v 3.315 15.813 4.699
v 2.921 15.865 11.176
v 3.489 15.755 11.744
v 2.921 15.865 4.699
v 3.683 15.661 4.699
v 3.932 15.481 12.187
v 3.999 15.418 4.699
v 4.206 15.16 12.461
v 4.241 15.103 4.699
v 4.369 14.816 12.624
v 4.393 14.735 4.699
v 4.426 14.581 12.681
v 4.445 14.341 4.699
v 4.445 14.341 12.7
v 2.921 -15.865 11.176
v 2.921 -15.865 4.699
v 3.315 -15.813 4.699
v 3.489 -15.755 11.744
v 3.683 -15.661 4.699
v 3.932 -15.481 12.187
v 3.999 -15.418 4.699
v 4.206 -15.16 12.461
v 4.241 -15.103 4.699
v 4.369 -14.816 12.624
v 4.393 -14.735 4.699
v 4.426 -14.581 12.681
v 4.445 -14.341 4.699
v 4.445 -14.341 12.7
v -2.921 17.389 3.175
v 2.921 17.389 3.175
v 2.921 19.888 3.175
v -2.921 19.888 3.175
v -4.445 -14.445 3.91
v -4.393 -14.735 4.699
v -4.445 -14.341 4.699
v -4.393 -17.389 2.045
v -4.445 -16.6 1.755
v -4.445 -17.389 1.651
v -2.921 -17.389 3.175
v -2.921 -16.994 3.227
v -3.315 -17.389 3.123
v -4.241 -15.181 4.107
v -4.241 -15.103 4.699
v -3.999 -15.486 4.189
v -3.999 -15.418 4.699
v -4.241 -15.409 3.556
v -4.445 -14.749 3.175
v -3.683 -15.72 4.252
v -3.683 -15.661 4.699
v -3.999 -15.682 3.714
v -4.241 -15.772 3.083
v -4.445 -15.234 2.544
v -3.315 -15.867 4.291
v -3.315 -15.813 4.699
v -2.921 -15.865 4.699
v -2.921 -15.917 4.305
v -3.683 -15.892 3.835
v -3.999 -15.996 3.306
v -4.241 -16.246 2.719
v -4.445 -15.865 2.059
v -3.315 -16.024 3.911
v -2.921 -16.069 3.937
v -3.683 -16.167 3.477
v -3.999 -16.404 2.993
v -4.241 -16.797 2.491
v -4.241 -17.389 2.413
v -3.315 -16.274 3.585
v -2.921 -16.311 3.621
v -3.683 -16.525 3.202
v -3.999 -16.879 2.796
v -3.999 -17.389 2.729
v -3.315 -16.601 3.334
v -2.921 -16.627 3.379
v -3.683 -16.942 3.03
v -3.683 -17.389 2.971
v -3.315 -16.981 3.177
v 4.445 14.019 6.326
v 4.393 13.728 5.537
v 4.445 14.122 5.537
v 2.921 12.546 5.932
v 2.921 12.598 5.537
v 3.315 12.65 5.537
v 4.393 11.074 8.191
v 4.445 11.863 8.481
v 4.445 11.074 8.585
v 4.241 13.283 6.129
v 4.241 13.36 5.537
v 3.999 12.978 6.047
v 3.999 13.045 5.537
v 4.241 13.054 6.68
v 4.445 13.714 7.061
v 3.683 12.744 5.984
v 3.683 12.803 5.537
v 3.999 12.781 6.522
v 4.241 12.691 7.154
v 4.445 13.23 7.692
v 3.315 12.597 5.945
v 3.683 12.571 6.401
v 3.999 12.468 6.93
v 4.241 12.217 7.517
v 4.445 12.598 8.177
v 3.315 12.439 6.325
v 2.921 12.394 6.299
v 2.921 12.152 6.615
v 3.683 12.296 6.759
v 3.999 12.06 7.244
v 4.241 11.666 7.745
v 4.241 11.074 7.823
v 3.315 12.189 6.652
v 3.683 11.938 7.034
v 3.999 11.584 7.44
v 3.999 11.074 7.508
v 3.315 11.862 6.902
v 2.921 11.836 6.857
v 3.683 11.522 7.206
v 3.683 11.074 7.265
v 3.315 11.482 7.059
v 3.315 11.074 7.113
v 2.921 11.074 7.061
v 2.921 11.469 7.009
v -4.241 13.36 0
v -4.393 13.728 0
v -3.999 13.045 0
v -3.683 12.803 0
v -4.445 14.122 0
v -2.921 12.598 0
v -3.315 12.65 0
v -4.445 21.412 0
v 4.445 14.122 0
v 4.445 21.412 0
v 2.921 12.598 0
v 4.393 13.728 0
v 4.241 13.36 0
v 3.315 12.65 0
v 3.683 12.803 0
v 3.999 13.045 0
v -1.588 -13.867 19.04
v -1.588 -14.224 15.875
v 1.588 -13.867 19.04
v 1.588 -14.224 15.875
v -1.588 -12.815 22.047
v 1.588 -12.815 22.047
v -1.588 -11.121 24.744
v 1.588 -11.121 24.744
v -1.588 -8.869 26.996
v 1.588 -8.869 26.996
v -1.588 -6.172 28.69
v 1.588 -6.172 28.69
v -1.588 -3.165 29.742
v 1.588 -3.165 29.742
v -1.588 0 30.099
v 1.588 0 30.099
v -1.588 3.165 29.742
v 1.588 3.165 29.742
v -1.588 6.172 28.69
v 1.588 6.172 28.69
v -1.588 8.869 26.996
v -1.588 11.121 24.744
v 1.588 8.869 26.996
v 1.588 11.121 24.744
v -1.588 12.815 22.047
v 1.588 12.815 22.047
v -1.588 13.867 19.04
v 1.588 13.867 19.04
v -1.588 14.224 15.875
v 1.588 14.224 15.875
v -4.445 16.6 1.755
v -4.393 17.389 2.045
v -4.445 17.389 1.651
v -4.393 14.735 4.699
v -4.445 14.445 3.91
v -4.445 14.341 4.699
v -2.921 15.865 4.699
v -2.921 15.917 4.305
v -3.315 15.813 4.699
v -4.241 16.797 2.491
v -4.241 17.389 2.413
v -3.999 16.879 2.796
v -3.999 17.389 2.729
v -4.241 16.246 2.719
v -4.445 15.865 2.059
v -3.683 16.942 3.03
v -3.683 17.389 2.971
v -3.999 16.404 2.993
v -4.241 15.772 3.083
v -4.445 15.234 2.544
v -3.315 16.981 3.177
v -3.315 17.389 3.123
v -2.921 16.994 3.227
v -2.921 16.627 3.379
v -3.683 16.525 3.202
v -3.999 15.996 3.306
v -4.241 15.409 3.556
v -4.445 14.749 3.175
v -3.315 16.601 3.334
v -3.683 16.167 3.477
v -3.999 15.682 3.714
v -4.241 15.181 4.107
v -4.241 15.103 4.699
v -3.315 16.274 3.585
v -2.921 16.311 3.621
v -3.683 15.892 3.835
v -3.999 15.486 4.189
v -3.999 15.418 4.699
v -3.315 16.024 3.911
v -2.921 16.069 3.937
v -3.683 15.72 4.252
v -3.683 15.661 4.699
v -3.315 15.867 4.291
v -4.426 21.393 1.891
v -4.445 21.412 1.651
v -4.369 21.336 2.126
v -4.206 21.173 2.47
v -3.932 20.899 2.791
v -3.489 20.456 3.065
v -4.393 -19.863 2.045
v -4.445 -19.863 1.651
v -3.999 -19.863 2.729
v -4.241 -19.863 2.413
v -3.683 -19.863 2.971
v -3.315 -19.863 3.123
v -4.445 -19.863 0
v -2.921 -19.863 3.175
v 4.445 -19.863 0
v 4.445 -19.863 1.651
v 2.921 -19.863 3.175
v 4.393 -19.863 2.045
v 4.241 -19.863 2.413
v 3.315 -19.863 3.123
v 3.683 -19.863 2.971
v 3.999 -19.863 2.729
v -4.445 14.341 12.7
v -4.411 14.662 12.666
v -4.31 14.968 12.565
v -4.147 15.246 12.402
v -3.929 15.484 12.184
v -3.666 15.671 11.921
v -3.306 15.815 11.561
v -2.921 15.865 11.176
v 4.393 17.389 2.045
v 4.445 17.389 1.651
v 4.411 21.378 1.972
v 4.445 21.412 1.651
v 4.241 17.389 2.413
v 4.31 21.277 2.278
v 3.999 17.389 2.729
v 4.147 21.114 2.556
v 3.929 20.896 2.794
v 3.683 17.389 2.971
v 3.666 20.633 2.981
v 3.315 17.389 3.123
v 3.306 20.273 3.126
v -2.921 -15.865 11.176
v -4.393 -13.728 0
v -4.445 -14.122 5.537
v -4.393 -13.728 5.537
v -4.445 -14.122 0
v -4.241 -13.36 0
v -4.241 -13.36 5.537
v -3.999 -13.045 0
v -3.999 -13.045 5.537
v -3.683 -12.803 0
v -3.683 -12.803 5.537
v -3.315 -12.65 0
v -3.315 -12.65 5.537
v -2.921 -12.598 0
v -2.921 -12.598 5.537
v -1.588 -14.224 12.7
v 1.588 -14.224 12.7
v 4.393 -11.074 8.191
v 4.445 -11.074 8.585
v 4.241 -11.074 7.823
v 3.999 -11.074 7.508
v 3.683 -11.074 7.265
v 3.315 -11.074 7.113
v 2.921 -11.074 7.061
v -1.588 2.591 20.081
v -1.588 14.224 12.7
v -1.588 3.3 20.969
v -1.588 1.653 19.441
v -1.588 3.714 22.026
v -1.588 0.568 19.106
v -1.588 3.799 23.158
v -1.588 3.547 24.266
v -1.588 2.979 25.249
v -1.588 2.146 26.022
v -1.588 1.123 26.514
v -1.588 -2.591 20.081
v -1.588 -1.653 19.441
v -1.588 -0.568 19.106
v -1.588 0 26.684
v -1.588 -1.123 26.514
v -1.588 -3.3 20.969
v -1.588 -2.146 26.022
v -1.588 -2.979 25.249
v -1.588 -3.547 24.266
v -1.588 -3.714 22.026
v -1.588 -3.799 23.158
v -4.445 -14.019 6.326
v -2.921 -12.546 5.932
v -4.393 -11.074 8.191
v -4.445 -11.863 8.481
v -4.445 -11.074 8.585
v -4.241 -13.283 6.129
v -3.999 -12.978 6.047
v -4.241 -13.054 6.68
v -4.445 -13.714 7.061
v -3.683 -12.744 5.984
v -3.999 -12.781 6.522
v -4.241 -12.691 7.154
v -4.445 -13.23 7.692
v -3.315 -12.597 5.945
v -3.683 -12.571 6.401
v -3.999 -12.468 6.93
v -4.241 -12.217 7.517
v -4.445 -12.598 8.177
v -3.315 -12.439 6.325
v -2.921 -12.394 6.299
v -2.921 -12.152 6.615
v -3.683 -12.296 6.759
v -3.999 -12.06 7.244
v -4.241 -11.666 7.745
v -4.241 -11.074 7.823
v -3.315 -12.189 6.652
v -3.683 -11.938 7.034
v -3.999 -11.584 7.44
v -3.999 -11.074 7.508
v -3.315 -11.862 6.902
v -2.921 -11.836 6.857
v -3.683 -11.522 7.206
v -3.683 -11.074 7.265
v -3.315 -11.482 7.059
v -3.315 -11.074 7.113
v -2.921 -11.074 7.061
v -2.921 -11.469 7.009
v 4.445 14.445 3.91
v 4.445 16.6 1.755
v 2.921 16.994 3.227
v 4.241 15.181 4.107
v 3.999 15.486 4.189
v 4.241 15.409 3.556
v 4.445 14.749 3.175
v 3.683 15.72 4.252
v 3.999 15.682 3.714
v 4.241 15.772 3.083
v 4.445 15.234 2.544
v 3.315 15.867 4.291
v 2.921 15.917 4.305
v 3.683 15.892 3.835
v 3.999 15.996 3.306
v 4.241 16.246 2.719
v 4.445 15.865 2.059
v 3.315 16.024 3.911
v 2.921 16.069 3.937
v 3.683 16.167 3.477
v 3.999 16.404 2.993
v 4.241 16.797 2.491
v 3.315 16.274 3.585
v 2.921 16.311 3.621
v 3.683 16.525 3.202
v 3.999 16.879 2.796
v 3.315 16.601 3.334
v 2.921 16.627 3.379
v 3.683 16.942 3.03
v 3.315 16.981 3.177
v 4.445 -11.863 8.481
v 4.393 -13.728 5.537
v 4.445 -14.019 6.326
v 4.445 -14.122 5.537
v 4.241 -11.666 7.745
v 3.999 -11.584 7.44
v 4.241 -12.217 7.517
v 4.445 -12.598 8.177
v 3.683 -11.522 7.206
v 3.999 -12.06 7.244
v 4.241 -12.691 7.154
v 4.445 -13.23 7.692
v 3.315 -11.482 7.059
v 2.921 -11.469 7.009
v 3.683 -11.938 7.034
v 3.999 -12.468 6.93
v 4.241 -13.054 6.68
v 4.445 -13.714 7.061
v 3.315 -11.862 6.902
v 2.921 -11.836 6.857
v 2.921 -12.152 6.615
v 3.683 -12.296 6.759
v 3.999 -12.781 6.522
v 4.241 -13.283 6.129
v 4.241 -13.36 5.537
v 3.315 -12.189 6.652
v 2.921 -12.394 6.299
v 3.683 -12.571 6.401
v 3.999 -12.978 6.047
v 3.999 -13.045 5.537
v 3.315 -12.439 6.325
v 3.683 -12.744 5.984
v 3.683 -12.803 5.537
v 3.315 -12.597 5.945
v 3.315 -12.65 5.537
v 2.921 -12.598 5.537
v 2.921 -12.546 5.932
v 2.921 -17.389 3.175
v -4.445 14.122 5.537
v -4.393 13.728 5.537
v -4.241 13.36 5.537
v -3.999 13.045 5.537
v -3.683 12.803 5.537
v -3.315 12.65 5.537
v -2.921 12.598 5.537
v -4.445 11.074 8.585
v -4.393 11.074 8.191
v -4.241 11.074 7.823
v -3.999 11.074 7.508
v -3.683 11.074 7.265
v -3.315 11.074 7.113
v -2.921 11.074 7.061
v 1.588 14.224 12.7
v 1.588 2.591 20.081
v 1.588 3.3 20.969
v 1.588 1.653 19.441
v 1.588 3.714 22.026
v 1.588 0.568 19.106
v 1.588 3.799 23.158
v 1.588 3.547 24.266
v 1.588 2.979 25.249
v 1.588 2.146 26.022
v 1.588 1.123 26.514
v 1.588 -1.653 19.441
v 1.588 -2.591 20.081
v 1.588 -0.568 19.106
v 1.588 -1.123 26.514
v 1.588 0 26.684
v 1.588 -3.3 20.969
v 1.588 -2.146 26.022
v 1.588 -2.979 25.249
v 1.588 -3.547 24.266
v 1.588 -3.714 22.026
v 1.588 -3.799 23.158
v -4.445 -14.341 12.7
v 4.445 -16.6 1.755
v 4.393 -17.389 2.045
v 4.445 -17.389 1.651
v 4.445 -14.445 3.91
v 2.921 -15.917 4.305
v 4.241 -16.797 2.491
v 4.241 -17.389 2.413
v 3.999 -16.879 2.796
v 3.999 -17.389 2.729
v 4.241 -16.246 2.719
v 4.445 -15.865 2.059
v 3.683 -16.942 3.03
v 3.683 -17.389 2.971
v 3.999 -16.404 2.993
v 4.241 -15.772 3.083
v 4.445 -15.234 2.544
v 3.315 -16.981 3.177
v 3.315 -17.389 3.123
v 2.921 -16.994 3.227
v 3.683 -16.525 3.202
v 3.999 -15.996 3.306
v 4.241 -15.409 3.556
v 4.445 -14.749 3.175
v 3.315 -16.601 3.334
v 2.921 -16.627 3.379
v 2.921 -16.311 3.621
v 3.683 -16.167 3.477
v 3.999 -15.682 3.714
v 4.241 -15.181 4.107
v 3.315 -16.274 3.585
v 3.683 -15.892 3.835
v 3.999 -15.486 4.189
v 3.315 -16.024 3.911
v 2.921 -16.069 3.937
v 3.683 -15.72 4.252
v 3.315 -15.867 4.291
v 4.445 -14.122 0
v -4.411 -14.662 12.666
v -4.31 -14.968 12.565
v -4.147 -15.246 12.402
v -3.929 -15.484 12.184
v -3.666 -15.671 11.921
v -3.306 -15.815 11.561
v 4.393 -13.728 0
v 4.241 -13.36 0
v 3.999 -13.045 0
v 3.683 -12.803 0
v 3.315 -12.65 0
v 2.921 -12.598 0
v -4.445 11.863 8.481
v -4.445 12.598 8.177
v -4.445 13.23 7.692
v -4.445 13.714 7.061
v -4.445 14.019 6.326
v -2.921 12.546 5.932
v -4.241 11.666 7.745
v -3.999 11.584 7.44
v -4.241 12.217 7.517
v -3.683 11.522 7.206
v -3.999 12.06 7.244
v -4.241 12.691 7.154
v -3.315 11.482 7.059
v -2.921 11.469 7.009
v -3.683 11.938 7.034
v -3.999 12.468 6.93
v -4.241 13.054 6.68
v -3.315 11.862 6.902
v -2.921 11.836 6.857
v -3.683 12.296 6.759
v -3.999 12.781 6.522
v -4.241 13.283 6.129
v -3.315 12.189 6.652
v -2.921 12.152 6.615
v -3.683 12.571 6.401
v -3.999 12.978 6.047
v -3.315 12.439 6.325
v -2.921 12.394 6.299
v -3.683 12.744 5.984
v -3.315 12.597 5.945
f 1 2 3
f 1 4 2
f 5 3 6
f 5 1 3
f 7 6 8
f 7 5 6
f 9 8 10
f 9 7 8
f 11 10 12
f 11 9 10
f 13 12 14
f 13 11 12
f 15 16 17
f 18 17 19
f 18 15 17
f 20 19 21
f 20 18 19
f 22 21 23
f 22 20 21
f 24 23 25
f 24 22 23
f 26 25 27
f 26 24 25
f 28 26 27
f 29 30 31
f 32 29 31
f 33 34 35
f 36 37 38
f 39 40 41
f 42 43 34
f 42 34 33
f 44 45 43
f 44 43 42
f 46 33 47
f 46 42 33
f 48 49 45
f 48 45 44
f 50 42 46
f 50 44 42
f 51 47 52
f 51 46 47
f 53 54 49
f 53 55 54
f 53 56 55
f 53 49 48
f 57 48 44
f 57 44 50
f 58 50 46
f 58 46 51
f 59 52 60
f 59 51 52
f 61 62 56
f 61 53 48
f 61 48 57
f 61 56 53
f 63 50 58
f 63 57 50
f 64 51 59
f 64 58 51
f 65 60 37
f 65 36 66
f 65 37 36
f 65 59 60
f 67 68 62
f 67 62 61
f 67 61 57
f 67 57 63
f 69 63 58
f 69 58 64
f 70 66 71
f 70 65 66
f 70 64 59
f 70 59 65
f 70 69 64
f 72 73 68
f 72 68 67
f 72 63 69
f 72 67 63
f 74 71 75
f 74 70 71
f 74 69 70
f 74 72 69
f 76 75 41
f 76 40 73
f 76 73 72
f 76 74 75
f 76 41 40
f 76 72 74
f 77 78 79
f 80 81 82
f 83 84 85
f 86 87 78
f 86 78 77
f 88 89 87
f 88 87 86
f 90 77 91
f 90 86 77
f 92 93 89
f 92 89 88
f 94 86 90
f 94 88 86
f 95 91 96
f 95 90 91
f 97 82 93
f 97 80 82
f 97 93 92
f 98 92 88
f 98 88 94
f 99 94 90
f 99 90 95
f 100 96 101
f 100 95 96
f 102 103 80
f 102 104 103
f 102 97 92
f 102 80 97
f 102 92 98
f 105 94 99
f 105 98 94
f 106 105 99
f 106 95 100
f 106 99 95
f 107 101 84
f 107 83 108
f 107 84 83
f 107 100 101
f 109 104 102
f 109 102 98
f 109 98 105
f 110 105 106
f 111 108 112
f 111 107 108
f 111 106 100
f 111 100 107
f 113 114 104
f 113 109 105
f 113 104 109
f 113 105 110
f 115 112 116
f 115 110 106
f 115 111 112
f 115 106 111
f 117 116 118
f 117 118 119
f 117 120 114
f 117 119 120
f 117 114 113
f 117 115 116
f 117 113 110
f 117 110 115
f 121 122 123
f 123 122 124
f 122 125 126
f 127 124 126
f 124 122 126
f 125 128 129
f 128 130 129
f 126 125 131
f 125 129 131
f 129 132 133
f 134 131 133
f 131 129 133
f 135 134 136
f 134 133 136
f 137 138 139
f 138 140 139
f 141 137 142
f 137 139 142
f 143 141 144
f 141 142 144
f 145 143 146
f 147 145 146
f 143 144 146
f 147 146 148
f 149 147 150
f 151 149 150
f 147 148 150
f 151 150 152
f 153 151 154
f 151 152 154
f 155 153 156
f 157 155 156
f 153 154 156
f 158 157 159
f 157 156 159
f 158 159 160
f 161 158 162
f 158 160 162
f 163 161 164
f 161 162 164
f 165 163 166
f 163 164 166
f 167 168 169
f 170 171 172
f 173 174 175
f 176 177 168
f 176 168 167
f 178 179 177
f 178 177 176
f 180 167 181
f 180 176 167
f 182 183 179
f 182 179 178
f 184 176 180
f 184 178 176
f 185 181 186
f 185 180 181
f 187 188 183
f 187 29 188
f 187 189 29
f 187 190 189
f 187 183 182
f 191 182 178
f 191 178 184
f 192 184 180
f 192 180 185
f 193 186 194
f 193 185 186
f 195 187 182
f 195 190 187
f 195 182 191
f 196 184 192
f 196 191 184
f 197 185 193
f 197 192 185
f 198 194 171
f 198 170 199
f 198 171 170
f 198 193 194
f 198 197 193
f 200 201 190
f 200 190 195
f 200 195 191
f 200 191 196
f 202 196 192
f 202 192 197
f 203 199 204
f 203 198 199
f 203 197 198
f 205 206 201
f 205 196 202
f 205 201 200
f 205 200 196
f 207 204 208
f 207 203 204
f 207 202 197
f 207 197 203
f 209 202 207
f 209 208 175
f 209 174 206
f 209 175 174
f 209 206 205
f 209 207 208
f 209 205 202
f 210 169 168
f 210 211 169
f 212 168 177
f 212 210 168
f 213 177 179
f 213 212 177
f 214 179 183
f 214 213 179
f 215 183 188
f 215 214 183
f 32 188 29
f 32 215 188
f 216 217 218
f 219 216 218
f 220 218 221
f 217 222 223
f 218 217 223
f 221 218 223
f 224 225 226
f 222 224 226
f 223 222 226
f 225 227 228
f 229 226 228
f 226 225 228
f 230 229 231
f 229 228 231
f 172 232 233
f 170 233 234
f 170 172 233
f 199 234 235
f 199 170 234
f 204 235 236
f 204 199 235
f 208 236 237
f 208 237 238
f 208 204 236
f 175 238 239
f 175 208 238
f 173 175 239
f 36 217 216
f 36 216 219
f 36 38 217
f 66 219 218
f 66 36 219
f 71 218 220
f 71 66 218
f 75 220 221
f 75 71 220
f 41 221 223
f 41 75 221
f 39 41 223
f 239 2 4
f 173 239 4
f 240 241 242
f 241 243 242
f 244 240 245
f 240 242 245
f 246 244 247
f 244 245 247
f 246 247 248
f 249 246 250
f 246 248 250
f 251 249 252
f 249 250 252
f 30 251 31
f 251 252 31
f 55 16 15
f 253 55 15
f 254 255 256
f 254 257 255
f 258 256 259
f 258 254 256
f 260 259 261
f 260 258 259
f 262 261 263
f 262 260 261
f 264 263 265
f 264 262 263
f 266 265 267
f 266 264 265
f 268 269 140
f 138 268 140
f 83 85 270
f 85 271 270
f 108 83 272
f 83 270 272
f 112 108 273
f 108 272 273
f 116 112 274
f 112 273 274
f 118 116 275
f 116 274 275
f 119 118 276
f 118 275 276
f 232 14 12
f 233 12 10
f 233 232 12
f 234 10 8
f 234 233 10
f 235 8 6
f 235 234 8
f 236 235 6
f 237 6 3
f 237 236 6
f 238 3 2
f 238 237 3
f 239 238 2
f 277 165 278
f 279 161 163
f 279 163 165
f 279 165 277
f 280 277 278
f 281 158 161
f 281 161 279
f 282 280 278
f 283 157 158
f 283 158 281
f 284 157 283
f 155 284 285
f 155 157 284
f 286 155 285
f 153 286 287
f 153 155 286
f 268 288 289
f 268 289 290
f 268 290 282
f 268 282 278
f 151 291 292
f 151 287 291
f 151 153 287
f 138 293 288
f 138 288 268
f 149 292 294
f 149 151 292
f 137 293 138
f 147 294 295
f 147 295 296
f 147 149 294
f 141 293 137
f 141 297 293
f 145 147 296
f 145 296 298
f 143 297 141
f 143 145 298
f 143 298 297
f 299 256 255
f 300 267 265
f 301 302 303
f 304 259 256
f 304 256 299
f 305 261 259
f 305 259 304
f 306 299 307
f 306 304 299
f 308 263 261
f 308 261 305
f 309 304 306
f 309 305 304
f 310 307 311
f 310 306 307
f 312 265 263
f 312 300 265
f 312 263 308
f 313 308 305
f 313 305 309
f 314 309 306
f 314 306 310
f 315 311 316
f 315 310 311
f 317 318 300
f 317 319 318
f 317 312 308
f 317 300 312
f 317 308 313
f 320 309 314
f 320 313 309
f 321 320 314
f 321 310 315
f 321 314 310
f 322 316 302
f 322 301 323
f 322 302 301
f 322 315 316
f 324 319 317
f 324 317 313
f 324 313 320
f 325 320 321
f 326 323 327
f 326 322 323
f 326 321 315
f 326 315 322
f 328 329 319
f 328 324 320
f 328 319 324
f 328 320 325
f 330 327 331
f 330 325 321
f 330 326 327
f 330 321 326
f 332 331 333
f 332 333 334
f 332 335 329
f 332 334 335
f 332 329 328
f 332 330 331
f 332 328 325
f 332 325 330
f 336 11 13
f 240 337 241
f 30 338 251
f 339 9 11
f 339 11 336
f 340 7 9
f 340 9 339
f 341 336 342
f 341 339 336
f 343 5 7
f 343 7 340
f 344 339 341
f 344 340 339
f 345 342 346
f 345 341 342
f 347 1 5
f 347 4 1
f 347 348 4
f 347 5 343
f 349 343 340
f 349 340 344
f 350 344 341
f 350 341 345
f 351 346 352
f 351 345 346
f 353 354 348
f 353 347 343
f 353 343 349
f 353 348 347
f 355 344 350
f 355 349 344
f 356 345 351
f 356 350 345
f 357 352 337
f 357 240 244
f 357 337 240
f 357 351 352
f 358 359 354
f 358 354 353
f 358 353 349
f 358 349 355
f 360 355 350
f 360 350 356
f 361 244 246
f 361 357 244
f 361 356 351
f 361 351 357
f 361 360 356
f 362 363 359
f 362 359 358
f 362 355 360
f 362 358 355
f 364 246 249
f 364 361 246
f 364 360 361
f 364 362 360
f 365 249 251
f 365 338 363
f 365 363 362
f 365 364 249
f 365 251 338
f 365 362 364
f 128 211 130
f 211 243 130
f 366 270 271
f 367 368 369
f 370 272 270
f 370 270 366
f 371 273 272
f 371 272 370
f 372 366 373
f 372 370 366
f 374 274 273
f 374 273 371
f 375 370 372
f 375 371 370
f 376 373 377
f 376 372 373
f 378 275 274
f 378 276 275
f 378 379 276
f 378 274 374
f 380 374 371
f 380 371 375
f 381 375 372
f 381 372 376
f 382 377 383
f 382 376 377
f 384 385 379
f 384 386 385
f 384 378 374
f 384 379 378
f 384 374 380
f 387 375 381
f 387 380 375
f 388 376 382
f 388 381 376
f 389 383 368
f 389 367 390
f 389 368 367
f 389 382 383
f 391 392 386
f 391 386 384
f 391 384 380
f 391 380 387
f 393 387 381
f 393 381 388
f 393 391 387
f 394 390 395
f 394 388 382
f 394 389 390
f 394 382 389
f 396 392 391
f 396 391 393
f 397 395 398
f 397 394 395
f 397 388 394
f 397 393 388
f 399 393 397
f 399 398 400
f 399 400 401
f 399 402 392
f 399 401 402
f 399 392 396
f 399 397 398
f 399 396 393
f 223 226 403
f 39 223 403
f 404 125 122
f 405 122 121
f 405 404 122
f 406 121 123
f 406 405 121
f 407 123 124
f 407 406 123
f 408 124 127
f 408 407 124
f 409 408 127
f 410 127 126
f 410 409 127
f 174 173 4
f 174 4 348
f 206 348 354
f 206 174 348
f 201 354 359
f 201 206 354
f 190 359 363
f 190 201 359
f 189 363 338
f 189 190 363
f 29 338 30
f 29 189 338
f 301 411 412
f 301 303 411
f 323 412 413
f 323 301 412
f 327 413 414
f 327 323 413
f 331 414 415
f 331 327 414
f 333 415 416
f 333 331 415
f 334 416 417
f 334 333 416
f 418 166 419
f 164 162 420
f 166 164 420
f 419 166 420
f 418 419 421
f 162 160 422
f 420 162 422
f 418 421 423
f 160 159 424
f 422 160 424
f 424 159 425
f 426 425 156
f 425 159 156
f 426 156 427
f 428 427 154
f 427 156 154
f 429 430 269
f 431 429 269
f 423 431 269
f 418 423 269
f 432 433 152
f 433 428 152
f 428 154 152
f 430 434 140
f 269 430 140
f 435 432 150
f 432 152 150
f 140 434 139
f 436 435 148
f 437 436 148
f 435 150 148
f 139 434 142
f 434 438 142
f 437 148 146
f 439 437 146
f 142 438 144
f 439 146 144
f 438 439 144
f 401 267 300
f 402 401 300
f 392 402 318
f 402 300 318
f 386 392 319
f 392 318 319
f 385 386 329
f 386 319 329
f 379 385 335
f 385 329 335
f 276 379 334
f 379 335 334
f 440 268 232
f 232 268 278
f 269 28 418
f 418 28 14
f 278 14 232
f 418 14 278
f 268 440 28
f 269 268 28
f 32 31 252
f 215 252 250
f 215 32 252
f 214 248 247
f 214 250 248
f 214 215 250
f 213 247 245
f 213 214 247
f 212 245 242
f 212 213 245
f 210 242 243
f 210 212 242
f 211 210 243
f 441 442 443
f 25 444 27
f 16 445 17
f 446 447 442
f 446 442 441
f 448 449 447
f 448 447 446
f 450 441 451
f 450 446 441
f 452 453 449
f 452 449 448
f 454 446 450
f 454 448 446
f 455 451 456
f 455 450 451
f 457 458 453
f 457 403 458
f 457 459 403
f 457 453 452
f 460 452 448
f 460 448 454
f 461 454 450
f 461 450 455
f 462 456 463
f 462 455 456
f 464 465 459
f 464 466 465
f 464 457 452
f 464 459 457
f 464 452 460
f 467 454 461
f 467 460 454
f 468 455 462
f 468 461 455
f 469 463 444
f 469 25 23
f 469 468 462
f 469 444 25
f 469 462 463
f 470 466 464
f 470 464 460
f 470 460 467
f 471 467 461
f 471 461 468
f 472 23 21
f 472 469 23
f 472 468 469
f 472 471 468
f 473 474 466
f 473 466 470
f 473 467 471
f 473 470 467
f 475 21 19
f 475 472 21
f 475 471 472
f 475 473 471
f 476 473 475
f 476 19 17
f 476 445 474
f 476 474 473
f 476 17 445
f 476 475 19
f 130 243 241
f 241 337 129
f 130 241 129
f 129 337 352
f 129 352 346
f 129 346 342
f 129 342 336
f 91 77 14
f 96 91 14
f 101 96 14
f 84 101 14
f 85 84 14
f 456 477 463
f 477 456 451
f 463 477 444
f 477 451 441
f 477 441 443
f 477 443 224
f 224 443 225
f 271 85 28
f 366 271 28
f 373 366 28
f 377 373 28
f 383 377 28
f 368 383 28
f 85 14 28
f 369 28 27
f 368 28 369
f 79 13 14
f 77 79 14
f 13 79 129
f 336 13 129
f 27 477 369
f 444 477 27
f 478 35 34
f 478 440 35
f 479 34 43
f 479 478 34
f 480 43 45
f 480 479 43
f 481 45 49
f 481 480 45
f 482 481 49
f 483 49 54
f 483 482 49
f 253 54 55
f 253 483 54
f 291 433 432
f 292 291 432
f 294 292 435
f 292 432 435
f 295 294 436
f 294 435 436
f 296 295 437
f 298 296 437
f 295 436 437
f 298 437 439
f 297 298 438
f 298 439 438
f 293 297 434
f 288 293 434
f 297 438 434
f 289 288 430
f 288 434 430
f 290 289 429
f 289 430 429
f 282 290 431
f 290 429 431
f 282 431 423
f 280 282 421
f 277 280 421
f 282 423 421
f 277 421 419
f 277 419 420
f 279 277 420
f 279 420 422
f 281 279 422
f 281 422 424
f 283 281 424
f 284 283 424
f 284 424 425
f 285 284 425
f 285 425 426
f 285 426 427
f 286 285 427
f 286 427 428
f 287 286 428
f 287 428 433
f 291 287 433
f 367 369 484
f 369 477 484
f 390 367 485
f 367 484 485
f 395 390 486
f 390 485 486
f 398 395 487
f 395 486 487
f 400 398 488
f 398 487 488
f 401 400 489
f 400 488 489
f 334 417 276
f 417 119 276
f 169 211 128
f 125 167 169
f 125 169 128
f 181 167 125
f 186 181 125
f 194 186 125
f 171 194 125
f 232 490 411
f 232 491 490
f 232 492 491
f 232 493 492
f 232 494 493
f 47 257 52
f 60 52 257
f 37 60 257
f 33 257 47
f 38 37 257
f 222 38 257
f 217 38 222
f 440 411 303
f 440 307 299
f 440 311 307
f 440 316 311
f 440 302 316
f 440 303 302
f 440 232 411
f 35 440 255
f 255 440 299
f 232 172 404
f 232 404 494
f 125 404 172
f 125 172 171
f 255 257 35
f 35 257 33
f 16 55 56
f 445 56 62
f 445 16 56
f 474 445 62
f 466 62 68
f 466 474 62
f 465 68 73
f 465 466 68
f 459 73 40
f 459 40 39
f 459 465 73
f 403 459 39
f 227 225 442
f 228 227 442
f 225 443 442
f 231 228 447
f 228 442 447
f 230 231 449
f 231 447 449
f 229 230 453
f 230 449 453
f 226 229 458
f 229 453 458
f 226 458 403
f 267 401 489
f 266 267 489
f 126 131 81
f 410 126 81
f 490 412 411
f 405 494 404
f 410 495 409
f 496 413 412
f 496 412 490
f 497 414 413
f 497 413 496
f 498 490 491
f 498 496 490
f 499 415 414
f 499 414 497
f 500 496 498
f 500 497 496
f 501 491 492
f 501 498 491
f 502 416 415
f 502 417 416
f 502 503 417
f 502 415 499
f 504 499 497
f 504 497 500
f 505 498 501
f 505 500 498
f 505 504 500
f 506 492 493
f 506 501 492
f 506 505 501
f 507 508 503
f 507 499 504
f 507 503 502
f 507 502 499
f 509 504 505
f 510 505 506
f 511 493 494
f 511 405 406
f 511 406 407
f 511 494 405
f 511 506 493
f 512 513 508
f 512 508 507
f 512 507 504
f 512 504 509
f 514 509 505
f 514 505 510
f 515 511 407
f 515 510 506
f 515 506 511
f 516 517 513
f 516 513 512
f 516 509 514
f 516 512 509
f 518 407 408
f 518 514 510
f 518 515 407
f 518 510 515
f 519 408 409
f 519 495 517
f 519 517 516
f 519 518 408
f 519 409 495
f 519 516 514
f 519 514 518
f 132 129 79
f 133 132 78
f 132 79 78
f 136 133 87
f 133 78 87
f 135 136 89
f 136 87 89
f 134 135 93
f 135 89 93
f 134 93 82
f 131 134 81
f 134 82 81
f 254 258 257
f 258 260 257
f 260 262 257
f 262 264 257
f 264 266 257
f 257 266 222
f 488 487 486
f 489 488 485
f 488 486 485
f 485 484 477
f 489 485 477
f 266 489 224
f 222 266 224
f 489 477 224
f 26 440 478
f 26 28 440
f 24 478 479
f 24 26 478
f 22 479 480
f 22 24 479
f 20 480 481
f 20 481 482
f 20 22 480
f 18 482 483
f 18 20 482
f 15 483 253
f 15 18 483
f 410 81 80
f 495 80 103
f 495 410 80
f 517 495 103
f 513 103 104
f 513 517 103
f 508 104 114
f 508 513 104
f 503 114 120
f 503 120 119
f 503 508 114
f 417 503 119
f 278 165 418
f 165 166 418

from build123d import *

# Parameters (mm, degrees)
BOSS_EXTRUDE1_DEPTH = 4.445
BOSS_EXTRUDE2_DEPTH = 1.5875
SKETCH5_R           = 3.81
CUT_EXTRUDE1_DEPTH  = 127
FILLET2_R           = 1.524
FILLET3_R           = 1.524
FILLET4_R           = 1.524


with BuildPart() as part:
    # Sketch3 → Boss-Extrude1 (new, symmetric)
    with BuildSketch(Plane.YZ):
        Polygon((-19.8628, 0), (-19.8628, 3.175), (-15.86484, 3.175), (-15.86484, 12.7), (15.86484, 12.7), (15.86484, 3.175), (21.4122, 3.175), (21.4122, 0), (12.5984, 0), (12.5984, 7.0612), (-12.5984, 7.0612), (-12.5984, 0), align=None)
    extrude(amount=BOSS_EXTRUDE1_DEPTH, both=True)

    # Sketch4 → Boss-Extrude2 (add, symmetric)
    with BuildSketch(Plane.YZ):
        with BuildLine():
            Line((-14.224, 12.7), (-14.224, 15.875))
            ThreePointArc((-14.224, 15.875), (0, 30.099), (14.224, 15.875))
            Line((14.224, 15.875), (14.224, 12.7))
            Line((14.224, 12.7), (15.86484, 12.7))
            Line((15.86484, 12.7), (15.86484, 3.175))
            Line((15.86484, 3.175), (21.4122, 3.175))
            Line((21.4122, 3.175), (21.4122, 0))
            Line((21.4122, 0), (12.5984, 0))
            Line((12.5984, 0), (12.5984, 7.0612))
            Line((12.5984, 7.0612), (-12.5984, 7.0612))
            Line((-12.5984, 7.0612), (-12.5984, 0))
            Line((-12.5984, 0), (-19.8628, 0))
            Line((-19.8628, 0), (-19.8628, 3.175))
            Line((-19.8628, 3.175), (-15.86484, 3.175))
            Line((-15.86484, 3.175), (-15.86484, 12.7))
            Line((-15.86484, 12.7), (-14.224, 12.7))
        make_face()
    extrude(amount=BOSS_EXTRUDE2_DEPTH, both=True)

    # Sketch5 → Cut-Extrude1 (cut)
    with BuildSketch(Plane.YZ.offset(4.445)):
        with Locations(Location((0, 22.873624204, 0), (0, 0, 90))):
            Circle(SKETCH5_R)
    extrude(amount=-CUT_EXTRUDE1_DEPTH, mode=Mode.SUBTRACT)

    # Fillet2
    fillet2_edges = [part.edges().sort_by_distance(p)[0] for p in [
        (4.445, 15.86484, 7.9375),
        (4.445, 18.63852, 3.175),
        (0, 15.86484, 12.7),
        (0, 15.86484, 3.175),
        (0, 21.4122, 3.175),
        (-4.445, 18.63852, 3.175),
        (-4.445, 15.86484, 7.9375),
    ]]
    fillet(fillet2_edges, radius=FILLET2_R)

    # Fillet3
    fillet3_edges = [part.edges().sort_by_distance(p)[0] for p in [
        (4.445, -17.86382, 3.175),
        (4.445, -15.86484, 7.9375),
        (0, -15.86484, 3.175),
        (0, -15.86484, 12.7),
        (-4.445, -15.86484, 7.9375),
        (-4.445, -17.86382, 3.175),
    ]]
    fillet(fillet3_edges, radius=FILLET3_R)

    # Fillet4
    fillet4_edges = [part.edges().sort_by_distance(p)[0] for p in [
        (-4.445, 0, 7.0612),
        (4.445, 12.5984, 3.5306),
        (4.445, 0, 7.0612),
        (4.445, -12.5984, 3.5306),
        (-4.445, 12.5984, 3.5306),
        (0, 12.5984, 7.0612),
        (0, -12.5984, 7.0612),
        (-4.445, -12.5984, 3.5306),
    ]]
    fillet(fillet4_edges, radius=FILLET4_R)


solid = part.part
